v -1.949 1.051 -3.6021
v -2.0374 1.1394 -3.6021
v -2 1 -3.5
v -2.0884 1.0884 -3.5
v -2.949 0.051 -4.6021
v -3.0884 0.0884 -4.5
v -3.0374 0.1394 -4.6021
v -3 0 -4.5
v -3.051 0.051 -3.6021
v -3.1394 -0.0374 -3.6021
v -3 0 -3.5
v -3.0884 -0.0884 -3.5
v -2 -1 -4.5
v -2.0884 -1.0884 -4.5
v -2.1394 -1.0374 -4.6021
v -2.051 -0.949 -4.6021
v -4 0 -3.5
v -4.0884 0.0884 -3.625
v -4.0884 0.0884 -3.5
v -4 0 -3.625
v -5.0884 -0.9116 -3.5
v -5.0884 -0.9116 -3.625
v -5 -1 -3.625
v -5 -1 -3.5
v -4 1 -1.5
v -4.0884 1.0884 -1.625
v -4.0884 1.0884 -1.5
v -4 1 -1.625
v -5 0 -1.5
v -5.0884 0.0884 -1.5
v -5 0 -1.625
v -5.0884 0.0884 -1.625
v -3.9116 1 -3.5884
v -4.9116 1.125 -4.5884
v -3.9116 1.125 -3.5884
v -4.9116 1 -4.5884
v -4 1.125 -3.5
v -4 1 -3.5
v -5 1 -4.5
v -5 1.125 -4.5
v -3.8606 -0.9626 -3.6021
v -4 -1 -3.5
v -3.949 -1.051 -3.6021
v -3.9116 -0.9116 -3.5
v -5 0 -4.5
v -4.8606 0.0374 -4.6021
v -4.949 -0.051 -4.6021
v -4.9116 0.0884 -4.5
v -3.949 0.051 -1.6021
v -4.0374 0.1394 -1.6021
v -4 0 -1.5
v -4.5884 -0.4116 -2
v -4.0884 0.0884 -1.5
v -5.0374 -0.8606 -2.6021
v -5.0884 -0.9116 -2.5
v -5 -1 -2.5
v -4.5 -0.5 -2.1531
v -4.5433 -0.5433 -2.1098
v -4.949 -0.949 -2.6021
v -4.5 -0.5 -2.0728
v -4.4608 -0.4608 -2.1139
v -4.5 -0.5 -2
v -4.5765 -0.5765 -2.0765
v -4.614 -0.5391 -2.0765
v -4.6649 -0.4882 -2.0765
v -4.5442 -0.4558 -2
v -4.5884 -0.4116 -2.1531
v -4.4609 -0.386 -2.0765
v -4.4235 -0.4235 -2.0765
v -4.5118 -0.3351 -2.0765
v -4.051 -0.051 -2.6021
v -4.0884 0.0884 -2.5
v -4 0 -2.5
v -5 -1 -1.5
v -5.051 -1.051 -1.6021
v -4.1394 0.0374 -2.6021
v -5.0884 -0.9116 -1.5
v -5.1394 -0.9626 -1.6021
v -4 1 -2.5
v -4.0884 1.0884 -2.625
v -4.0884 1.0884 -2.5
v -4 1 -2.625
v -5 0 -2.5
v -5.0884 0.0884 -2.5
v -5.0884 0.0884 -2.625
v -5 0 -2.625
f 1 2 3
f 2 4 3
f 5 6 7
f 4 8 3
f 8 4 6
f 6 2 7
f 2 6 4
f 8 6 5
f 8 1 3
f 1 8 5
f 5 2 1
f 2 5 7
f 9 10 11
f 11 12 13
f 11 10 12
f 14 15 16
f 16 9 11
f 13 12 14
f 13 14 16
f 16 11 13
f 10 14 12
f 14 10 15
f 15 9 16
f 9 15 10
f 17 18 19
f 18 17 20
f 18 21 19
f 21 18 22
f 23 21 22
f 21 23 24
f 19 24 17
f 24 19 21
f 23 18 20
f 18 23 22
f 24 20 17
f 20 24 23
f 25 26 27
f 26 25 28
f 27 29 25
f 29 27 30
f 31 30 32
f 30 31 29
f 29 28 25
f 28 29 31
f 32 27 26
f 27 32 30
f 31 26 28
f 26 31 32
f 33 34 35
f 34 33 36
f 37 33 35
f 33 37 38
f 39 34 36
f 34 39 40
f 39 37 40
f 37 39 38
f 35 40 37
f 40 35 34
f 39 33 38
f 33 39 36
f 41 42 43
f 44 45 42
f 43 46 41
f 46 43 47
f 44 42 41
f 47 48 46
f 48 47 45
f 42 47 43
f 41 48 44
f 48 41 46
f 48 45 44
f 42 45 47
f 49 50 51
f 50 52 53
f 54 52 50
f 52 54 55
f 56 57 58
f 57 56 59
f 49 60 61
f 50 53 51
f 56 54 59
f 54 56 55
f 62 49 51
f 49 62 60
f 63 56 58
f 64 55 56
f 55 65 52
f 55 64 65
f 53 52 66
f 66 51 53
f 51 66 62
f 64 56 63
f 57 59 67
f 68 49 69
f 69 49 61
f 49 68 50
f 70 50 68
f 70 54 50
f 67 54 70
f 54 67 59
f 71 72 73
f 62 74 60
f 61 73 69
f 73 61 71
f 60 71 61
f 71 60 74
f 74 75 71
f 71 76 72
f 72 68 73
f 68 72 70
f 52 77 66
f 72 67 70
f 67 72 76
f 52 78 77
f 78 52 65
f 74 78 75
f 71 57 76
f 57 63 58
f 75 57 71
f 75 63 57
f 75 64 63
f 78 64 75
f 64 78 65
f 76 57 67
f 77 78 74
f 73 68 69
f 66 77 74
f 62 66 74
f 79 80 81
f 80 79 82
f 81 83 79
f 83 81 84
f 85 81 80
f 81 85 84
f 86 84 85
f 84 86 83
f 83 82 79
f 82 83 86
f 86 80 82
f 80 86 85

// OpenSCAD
translate(v = [-0.5, -0.5, 0]) {
	/*Shell 0*/
	union() {
		%/*Nodes shell 0*/
		union();
		/*Edges shell 0*/
		union();
	}
	/*Shell 1*/
	union() {
		%/*Nodes shell 1*/
		union() {
			/*Node bank.devices[0].thingy.vpump1*/
			color(alpha = 0.1, c = "black") {
				translate(v = [-2, -1, -2]) {
					cube(size = [1, 1, 1]);
				}
			}
			/*Node bank.devices[0].thingy.vpump2*/
			color(alpha = 0.1, c = "black") {
				translate(v = [-2, -1, -1]) {
					cube(size = [1, 1, 1]);
				}
			}
			/*Node bank.devices[0].thingy.vpump3*/
			color(alpha = 0.1, c = "black") {
				translate(v = [0, -2, -1]) {
					cube(size = [1, 1, 1]);
				}
			}
			/*Node bank.devices[0].thingy.vsep*/
			color(alpha = 0.1, c = "black") {
				translate(v = [-1, -2, 0]) {
					cube(size = [1, 1, 1]);
				}
			}
			/*Node bank.devices[0].thingy.vsieve*/
			color(alpha = 0.1, c = "black") {
				translate(v = [1, -2, 0]) {
					cube(size = [1, 1, 1]);
				}
			}
			/*Node $_35__1*/
			color(alpha = 0.1, c = "lightblue") {
				translate(v = [-1, -2, 2]) {
					cube(size = [1, 1, 1]);
				}
			}
			/*Node $_22__1*/
			color(alpha = 0.1, c = "lightblue") {
				translate(v = [-1, -2, 1]) {
					cube(size = [1, 1, 1]);
				}
			}
			/*Node $_28__1*/
			color(alpha = 0.1, c = "lightblue") {
				translate(v = [-2, 0, 0]) {
					cube(size = [1, 1, 1]);
				}
			}
			/*Node $_27__1*/
			color(alpha = 0.1, c = "lightblue") {
				translate(v = [-2, -2, 1]) {
					cube(size = [1, 1, 1]);
				}
			}
			/*Node $_26__1*/
			color(alpha = 0.1, c = "lightblue") {
				translate(v = [-2, -2, 0]) {
					cube(size = [1, 1, 1]);
				}
			}
			/*Node $_36__1*/
			color(alpha = 0.1, c = "lightblue") {
				translate(v = [0, 1, -2]) {
					cube(size = [1, 1, 1]);
				}
			}
			/*Node $_34__1*/
			color(alpha = 0.1, c = "lightblue") {
				translate(v = [1, -2, -2]) {
					cube(size = [1, 1, 1]);
				}
			}
			/*Node $_21__1*/
			color(alpha = 0.1, c = "lightblue") {
				translate(v = [2, -2, 0]) {
					cube(size = [1, 1, 1]);
				}
			}
			/*Node $_14__1*/
			color(alpha = 0.1, c = "lightblue") {
				translate(v = [-2, 0, 1]) {
					cube(size = [1, 1, 1]);
				}
			}
			/*Node $_39__1*/
			color(alpha = 0.1, c = "lightblue") {
				translate(v = [-2, 0, -2]) {
					cube(size = [1, 1, 1]);
				}
			}
			/*Node $_23__1*/
			color(alpha = 0.1, c = "lightblue") {
				translate(v = [-2, -1, 0]) {
					cube(size = [1, 1, 1]);
				}
			}
			/*Node $_13__1*/
			color(alpha = 0.1, c = "lightblue") {
				translate(v = [0, -2, 0]) {
					cube(size = [1, 1, 1]);
				}
			}
			/*Node $_24__1*/
			color(alpha = 0.1, c = "lightblue") {
				translate(v = [-2, -2, -1]) {
					cube(size = [1, 1, 1]);
				}
			}
			/*Node $_15__1*/
			color(alpha = 0.1, c = "lightblue") {
				translate(v = [-1, -2, -2]) {
					cube(size = [1, 1, 1]);
				}
			}
			/*Node $_25__1*/
			color(alpha = 0.1, c = "lightblue") {
				translate(v = [0, -2, -2]) {
					cube(size = [1, 1, 1]);
				}
			}
			/*Node $_12__1*/
			color(alpha = 0.1, c = "lightblue") {
				translate(v = [2, -2, -2]) {
					cube(size = [1, 1, 1]);
				}
			}
		}
		/*Edges shell 1*/
		union();
	}
	/*Shell 2*/
	union() {
		%/*Nodes shell 2*/
		union();
		/*Edges shell 2*/
		union();
	}
	/*Shell 3*/
	union() {
		%/*Nodes shell 3*/
		union() {
			/*Node bank.devices[0].thingy.vbead_in*/
			color(alpha = 0.1, c = "black") {
				translate(v = [-2, 1, -4]) {
					cube(size = [1, 1, 1]);
				}
			}
			/*Node bank.devices[0].thingy.vbead_out*/
			color(alpha = 0.1, c = "black") {
				translate(v = [-3, 0, -4]) {
					cube(size = [1, 1, 1]);
				}
			}
			/*Node bank.devices[0].thingy.vcell_in*/
			color(alpha = 0.1, c = "black") {
				translate(v = [-4, 0, -4]) {
					cube(size = [1, 1, 1]);
				}
			}
			/*Node bank.devices[0].thingy.vcell_out*/
			color(alpha = 0.1, c = "black") {
				translate(v = [-4, 1, -2]) {
					cube(size = [1, 1, 1]);
				}
			}
			/*Node bank.devices[0].thingy.vcollect*/
			color(alpha = 0.1, c = "black") {
				translate(v = [-4, 1, -4]) {
					cube(size = [1, 1, 1]);
				}
			}
			/*Node bank.devices[0].thingy.vlysis_in*/
			color(alpha = 0.1, c = "black") {
				translate(v = [-4, -1, -4]) {
					cube(size = [1, 1, 1]);
				}
			}
			/*Node bank.devices[0].thingy.vlysis_out*/
			color(alpha = 0.1, c = "black") {
				translate(v = [-4, 0, -2]) {
					cube(size = [1, 1, 1]);
				}
			}
			/*Node bank.devices[0].thingy.vpush*/
			color(alpha = 0.1, c = "black") {
				translate(v = [-4, 0, -3]) {
					cube(size = [1, 1, 1]);
				}
			}
			/*Node bank.devices[0].thingy.vwaste*/
			color(alpha = 0.1, c = "black") {
				translate(v = [-4, 1, -3]) {
					cube(size = [1, 1, 1]);
				}
			}
		}
		/*Edges shell 3*/
		union() {
			/*Edge 2 from bank.devices[0].thingy.vbead_in to $_2*/
			translate(v = [-2.5, 0.5, -4.5]) {
				rotate(a = [0, 54.735610317245346, 45.0]) {
					cube(size = [0.125, 0.125, 1.7320508075688772]);
				}
			}
			/*Edge 3 from bank.devices[0].thingy.vbead_out to $_3*/
			translate(v = [-1.5, -0.5, -4.5]) {
				rotate(a = [0, 54.735610317245346, 135.0]) {
					cube(size = [0.125, 0.125, 1.7320508075688772]);
				}
			}
			/*Edge 4 from bank.devices[0].thingy.vcell_in to $_4*/
			translate(v = [-4.5, -0.5, -3.5]) {
				rotate(a = [0, 90.0, 45.0]) {
					cube(size = [0.125, 0.125, 1.4142135623730951]);
				}
			}
			/*Edge 5 from bank.devices[0].thingy.vcell_out to $_5*/
			translate(v = [-4.5, 0.5, -1.5]) {
				rotate(a = [0, 90.0, 45.0]) {
					cube(size = [0.125, 0.125, 1.4142135623730951]);
				}
			}
			/*Edge 6 from bank.devices[0].thingy.vcollect to $_6*/
			translate(v = [-4.5, 1.5, -4.5]) {
				rotate(a = [0, 45.00000000000001, 0.0]) {
					cube(size = [0.125, 0.125, 1.4142135623730951]);
				}
			}
			/*Edge 7 from bank.devices[0].thingy.vlysis_in to $_7*/
			translate(v = [-4.5, 0.5, -4.5]) {
				rotate(a = [0, 54.735610317245346, -45.0]) {
					cube(size = [0.125, 0.125, 1.7320508075688772]);
				}
			}
			/*Edge 8 from bank.devices[0].thingy.vlysis_out to $_8*/
			translate(v = [-4.5, -0.5, -2.5]) {
				rotate(a = [0, 54.735610317245346, 45.0]) {
					cube(size = [0.125, 0.125, 1.7320508075688772]);
				}
			}
			/*Edge 9 from bank.devices[0].thingy.vpush to $_9*/
			translate(v = [-4.5, -0.5, -1.5]) {
				rotate(a = [0, 125.26438968275465, 45.0]) {
					cube(size = [0.125, 0.125, 1.7320508075688772]);
				}
			}
			/*Edge 10 from bank.devices[0].thingy.vwaste to $_10*/
			translate(v = [-4.5, 0.5, -2.5]) {
				rotate(a = [0, 90.0, 45.0]) {
					cube(size = [0.125, 0.125, 1.4142135623730951]);
				}
			}
		}
	}
	/*Shell 4*/
	union() {
		%/*Nodes shell 4*/
		union() {
			/*Node $_2*/
			color(alpha = 0.1, c = "pink") {
				translate(v = [-3, 0, -5]) {
					cube(size = [1, 1, 1]);
				}
			}
			/*Node $_3*/
			color(alpha = 0.1, c = "pink") {
				translate(v = [-2, -1, -5]) {
					cube(size = [1, 1, 1]);
				}
			}
			/*Node $_4*/
			color(alpha = 0.1, c = "pink") {
				translate(v = [-5, -1, -4]) {
					cube(size = [1, 1, 1]);
				}
			}
			/*Node $_5*/
			color(alpha = 0.1, c = "pink") {
				translate(v = [-5, 0, -2]) {
					cube(size = [1, 1, 1]);
				}
			}
			/*Node $_6*/
			color(alpha = 0.1, c = "pink") {
				translate(v = [-5, 1, -5]) {
					cube(size = [1, 1, 1]);
				}
			}
			/*Node $_7*/
			color(alpha = 0.1, c = "pink") {
				translate(v = [-5, 0, -5]) {
					cube(size = [1, 1, 1]);
				}
			}
			/*Node $_8*/
			color(alpha = 0.1, c = "pink") {
				translate(v = [-5, -1, -3]) {
					cube(size = [1, 1, 1]);
				}
			}
			/*Node $_9*/
			color(alpha = 0.1, c = "pink") {
				translate(v = [-5, -1, -2]) {
					cube(size = [1, 1, 1]);
				}
			}
			/*Node $_10*/
			color(alpha = 0.1, c = "pink") {
				translate(v = [-5, 0, -3]) {
					cube(size = [1, 1, 1]);
				}
			}
		}
		/*Edges shell 4*/
		union();
	}
}
